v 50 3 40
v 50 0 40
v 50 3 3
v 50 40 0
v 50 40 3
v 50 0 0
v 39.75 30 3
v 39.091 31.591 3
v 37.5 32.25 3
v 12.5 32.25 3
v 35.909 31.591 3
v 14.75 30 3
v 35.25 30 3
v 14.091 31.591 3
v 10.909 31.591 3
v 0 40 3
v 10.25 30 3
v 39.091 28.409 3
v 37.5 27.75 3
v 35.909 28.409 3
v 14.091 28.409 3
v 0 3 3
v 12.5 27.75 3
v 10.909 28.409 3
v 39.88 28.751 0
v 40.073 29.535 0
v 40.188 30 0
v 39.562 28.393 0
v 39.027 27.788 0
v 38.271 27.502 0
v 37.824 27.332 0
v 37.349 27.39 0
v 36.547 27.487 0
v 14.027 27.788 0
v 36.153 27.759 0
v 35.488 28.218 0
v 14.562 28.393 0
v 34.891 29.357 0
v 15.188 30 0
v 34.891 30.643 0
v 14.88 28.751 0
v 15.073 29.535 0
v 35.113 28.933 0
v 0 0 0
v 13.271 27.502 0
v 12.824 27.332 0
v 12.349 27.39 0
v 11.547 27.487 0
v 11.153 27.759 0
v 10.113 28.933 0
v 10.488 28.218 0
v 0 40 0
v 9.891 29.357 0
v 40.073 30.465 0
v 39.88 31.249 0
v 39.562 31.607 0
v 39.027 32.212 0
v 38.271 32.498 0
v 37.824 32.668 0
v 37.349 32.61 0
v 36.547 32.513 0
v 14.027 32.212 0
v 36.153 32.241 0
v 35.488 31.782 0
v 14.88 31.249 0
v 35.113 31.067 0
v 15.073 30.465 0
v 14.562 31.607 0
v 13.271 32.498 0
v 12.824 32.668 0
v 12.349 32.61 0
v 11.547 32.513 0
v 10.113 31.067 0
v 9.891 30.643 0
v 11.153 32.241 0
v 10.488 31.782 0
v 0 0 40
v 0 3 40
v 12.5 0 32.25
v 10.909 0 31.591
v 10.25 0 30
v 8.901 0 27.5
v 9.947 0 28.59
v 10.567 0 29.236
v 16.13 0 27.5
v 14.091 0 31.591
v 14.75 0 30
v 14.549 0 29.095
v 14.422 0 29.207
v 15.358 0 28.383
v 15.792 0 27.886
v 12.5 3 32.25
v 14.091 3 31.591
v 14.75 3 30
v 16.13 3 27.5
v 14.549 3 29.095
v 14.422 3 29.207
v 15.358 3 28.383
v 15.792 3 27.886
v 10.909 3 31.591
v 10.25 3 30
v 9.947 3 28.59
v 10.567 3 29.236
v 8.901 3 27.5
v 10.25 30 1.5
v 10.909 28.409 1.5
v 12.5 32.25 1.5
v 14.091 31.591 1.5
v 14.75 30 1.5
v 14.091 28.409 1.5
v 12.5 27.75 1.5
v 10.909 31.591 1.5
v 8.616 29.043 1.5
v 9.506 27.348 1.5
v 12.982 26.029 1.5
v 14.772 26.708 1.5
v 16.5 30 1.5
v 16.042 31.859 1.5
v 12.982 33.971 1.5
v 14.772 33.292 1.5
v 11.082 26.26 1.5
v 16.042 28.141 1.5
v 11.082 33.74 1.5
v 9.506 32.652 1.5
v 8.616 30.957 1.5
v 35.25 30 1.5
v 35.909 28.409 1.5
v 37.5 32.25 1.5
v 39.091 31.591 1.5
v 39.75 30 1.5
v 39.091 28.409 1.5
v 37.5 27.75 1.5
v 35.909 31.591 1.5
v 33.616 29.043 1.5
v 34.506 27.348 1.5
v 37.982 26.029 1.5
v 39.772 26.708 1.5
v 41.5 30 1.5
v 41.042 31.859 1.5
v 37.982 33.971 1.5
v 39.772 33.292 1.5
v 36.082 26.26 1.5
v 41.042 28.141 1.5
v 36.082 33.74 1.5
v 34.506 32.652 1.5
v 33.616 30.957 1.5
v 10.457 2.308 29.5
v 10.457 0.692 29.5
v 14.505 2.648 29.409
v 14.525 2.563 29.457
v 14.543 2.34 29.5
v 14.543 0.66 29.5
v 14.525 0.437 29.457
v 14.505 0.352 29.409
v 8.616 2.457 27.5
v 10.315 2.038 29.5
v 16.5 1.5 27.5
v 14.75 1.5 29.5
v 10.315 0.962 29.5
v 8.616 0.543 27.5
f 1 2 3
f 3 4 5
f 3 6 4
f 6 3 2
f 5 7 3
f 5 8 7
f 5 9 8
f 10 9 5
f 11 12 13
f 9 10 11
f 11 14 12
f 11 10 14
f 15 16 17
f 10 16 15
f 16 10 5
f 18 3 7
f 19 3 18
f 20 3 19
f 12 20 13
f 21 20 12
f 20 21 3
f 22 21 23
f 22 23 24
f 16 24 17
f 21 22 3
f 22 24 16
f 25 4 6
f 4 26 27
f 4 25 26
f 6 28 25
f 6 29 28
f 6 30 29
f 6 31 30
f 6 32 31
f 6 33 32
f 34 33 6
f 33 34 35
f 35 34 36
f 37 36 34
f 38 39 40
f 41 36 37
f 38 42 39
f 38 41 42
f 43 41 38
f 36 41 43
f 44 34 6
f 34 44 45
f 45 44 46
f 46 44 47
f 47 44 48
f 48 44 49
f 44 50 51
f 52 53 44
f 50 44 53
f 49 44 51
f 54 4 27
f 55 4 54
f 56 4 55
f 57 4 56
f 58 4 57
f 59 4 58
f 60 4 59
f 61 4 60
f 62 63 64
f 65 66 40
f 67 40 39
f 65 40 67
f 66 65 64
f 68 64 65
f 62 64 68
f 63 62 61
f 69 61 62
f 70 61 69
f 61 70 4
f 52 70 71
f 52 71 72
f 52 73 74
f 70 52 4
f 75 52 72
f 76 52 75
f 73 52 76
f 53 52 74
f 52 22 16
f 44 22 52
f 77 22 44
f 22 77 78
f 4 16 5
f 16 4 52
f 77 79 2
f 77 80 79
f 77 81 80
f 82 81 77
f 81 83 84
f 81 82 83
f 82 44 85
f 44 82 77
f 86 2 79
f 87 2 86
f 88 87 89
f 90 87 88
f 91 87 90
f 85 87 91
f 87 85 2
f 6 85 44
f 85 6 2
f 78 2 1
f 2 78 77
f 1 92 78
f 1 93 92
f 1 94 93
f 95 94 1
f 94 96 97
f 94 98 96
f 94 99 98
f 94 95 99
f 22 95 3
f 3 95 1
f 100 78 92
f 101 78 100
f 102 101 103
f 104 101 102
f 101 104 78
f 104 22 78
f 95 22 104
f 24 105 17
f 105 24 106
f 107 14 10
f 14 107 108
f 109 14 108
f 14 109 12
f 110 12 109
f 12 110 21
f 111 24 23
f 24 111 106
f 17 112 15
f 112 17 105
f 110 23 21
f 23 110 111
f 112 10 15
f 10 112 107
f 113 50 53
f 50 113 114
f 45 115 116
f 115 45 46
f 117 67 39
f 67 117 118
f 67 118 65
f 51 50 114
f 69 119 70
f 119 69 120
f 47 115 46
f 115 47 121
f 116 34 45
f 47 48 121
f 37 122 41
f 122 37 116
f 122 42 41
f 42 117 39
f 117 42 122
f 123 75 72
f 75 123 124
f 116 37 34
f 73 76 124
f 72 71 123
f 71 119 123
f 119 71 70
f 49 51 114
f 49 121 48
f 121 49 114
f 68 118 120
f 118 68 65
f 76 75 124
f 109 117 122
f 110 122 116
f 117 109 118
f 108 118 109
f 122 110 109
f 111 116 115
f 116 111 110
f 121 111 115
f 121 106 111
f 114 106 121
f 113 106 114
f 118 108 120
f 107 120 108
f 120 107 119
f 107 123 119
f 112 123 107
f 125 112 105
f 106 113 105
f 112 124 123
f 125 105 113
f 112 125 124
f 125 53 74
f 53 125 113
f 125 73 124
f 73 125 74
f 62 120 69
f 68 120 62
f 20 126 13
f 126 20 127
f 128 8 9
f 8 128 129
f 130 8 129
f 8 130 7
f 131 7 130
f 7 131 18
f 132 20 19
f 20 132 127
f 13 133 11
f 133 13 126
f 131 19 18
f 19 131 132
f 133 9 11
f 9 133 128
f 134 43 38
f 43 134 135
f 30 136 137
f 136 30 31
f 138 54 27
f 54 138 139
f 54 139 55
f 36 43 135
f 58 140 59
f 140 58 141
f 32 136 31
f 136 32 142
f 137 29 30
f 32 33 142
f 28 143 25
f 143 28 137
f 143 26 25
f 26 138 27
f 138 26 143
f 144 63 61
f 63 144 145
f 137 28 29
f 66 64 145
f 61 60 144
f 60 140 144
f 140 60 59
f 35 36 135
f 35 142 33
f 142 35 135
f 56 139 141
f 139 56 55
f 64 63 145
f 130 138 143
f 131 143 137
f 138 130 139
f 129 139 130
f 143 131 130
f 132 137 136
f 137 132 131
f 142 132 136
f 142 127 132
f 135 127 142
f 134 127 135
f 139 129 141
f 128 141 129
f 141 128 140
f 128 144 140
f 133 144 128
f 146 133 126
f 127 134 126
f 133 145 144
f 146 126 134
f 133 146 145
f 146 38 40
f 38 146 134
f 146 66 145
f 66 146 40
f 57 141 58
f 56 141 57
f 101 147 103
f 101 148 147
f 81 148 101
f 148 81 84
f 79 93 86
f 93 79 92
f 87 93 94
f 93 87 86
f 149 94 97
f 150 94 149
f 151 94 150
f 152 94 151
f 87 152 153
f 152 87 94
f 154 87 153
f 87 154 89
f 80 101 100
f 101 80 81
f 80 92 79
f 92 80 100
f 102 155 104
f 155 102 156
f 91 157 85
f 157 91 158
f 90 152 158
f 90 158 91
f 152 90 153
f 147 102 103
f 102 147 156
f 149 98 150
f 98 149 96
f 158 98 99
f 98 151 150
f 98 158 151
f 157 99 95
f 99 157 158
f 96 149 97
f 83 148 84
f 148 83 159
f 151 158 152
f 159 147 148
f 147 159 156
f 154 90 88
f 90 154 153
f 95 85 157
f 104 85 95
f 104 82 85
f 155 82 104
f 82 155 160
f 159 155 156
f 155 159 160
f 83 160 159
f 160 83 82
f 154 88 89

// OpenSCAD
// パラメータ設定
width = 50;
depth = 40;
height = 40;
thickness = 3;

// ねじ穴設定
hole_dia = 4.5;
cs_dia = 8.0;
cs_depth = 2.0;

// 皿穴モジュール（外側の面から座ぐりが入るように調整）
module countersunk_hole(is_vertical = false) {
    union() {
        // 貫通穴
        cylinder(d = hole_dia, h = thickness * 3, center = true);
        // 皿座面：外側の面(水平面なら下面、垂直面なら背面)に向けて配置
        if (is_vertical) {
            // 垂直面：Y=3（外側）の面から座ぐりを入れる
            translate([0, -thickness/2 + cs_depth/2, 0])
                rotate([90, 0, 0])
                    cylinder(d1 = hole_dia, d2 = cs_dia, h = cs_depth);
        } else {
            // 水平面：Z=0（下面）の面から座ぐりを入れる
            translate([0, 0, -thickness/2 + cs_depth/2])
                cylinder(d1 = hole_dia, d2 = cs_dia, h = cs_depth);
        }
    }
}

difference() {
    // L字金具の本体
    union() {
        // 水平面 (Y+方向に40mm伸びる)
        cube([width, depth, thickness]);
        // 垂直面 (Z+方向に40mm伸びる)
        cube([width, thickness, height]);
    }

    // 水平面の穴 (Y方向に縁から10mm内側 = Y=30)
    for (x = [12.5, 37.5]) {
        translate([x, 30, 0])
            countersunk_hole(false);
    }

    // 垂直面の穴 (Z方向に縁から10mm内側 = Z=30)
    for (x = [12.5, 3]) { // ※左右対称配置を修正
        translate([x, thickness/2, 30])
            rotate([90, 0, 0])
                countersunk_hole(true);
    }
}

// 補足：X方向の配置を [12.5, 37.5] に統一
difference() {
    union() {
        cube([width, depth, thickness]);
        cube([width, thickness, height]);
    }
    // 水平面用穴
    for (x = [12.5, 37.5]) {
        translate([x, 30, 0]) countersunk_hole(false);
    }
    // 垂直面用穴
    for (x = [12.5, 37.5]) {
        translate([x, thickness/2, 30]) rotate([90, 0, 0]) countersunk_hole(true);
    }
}
